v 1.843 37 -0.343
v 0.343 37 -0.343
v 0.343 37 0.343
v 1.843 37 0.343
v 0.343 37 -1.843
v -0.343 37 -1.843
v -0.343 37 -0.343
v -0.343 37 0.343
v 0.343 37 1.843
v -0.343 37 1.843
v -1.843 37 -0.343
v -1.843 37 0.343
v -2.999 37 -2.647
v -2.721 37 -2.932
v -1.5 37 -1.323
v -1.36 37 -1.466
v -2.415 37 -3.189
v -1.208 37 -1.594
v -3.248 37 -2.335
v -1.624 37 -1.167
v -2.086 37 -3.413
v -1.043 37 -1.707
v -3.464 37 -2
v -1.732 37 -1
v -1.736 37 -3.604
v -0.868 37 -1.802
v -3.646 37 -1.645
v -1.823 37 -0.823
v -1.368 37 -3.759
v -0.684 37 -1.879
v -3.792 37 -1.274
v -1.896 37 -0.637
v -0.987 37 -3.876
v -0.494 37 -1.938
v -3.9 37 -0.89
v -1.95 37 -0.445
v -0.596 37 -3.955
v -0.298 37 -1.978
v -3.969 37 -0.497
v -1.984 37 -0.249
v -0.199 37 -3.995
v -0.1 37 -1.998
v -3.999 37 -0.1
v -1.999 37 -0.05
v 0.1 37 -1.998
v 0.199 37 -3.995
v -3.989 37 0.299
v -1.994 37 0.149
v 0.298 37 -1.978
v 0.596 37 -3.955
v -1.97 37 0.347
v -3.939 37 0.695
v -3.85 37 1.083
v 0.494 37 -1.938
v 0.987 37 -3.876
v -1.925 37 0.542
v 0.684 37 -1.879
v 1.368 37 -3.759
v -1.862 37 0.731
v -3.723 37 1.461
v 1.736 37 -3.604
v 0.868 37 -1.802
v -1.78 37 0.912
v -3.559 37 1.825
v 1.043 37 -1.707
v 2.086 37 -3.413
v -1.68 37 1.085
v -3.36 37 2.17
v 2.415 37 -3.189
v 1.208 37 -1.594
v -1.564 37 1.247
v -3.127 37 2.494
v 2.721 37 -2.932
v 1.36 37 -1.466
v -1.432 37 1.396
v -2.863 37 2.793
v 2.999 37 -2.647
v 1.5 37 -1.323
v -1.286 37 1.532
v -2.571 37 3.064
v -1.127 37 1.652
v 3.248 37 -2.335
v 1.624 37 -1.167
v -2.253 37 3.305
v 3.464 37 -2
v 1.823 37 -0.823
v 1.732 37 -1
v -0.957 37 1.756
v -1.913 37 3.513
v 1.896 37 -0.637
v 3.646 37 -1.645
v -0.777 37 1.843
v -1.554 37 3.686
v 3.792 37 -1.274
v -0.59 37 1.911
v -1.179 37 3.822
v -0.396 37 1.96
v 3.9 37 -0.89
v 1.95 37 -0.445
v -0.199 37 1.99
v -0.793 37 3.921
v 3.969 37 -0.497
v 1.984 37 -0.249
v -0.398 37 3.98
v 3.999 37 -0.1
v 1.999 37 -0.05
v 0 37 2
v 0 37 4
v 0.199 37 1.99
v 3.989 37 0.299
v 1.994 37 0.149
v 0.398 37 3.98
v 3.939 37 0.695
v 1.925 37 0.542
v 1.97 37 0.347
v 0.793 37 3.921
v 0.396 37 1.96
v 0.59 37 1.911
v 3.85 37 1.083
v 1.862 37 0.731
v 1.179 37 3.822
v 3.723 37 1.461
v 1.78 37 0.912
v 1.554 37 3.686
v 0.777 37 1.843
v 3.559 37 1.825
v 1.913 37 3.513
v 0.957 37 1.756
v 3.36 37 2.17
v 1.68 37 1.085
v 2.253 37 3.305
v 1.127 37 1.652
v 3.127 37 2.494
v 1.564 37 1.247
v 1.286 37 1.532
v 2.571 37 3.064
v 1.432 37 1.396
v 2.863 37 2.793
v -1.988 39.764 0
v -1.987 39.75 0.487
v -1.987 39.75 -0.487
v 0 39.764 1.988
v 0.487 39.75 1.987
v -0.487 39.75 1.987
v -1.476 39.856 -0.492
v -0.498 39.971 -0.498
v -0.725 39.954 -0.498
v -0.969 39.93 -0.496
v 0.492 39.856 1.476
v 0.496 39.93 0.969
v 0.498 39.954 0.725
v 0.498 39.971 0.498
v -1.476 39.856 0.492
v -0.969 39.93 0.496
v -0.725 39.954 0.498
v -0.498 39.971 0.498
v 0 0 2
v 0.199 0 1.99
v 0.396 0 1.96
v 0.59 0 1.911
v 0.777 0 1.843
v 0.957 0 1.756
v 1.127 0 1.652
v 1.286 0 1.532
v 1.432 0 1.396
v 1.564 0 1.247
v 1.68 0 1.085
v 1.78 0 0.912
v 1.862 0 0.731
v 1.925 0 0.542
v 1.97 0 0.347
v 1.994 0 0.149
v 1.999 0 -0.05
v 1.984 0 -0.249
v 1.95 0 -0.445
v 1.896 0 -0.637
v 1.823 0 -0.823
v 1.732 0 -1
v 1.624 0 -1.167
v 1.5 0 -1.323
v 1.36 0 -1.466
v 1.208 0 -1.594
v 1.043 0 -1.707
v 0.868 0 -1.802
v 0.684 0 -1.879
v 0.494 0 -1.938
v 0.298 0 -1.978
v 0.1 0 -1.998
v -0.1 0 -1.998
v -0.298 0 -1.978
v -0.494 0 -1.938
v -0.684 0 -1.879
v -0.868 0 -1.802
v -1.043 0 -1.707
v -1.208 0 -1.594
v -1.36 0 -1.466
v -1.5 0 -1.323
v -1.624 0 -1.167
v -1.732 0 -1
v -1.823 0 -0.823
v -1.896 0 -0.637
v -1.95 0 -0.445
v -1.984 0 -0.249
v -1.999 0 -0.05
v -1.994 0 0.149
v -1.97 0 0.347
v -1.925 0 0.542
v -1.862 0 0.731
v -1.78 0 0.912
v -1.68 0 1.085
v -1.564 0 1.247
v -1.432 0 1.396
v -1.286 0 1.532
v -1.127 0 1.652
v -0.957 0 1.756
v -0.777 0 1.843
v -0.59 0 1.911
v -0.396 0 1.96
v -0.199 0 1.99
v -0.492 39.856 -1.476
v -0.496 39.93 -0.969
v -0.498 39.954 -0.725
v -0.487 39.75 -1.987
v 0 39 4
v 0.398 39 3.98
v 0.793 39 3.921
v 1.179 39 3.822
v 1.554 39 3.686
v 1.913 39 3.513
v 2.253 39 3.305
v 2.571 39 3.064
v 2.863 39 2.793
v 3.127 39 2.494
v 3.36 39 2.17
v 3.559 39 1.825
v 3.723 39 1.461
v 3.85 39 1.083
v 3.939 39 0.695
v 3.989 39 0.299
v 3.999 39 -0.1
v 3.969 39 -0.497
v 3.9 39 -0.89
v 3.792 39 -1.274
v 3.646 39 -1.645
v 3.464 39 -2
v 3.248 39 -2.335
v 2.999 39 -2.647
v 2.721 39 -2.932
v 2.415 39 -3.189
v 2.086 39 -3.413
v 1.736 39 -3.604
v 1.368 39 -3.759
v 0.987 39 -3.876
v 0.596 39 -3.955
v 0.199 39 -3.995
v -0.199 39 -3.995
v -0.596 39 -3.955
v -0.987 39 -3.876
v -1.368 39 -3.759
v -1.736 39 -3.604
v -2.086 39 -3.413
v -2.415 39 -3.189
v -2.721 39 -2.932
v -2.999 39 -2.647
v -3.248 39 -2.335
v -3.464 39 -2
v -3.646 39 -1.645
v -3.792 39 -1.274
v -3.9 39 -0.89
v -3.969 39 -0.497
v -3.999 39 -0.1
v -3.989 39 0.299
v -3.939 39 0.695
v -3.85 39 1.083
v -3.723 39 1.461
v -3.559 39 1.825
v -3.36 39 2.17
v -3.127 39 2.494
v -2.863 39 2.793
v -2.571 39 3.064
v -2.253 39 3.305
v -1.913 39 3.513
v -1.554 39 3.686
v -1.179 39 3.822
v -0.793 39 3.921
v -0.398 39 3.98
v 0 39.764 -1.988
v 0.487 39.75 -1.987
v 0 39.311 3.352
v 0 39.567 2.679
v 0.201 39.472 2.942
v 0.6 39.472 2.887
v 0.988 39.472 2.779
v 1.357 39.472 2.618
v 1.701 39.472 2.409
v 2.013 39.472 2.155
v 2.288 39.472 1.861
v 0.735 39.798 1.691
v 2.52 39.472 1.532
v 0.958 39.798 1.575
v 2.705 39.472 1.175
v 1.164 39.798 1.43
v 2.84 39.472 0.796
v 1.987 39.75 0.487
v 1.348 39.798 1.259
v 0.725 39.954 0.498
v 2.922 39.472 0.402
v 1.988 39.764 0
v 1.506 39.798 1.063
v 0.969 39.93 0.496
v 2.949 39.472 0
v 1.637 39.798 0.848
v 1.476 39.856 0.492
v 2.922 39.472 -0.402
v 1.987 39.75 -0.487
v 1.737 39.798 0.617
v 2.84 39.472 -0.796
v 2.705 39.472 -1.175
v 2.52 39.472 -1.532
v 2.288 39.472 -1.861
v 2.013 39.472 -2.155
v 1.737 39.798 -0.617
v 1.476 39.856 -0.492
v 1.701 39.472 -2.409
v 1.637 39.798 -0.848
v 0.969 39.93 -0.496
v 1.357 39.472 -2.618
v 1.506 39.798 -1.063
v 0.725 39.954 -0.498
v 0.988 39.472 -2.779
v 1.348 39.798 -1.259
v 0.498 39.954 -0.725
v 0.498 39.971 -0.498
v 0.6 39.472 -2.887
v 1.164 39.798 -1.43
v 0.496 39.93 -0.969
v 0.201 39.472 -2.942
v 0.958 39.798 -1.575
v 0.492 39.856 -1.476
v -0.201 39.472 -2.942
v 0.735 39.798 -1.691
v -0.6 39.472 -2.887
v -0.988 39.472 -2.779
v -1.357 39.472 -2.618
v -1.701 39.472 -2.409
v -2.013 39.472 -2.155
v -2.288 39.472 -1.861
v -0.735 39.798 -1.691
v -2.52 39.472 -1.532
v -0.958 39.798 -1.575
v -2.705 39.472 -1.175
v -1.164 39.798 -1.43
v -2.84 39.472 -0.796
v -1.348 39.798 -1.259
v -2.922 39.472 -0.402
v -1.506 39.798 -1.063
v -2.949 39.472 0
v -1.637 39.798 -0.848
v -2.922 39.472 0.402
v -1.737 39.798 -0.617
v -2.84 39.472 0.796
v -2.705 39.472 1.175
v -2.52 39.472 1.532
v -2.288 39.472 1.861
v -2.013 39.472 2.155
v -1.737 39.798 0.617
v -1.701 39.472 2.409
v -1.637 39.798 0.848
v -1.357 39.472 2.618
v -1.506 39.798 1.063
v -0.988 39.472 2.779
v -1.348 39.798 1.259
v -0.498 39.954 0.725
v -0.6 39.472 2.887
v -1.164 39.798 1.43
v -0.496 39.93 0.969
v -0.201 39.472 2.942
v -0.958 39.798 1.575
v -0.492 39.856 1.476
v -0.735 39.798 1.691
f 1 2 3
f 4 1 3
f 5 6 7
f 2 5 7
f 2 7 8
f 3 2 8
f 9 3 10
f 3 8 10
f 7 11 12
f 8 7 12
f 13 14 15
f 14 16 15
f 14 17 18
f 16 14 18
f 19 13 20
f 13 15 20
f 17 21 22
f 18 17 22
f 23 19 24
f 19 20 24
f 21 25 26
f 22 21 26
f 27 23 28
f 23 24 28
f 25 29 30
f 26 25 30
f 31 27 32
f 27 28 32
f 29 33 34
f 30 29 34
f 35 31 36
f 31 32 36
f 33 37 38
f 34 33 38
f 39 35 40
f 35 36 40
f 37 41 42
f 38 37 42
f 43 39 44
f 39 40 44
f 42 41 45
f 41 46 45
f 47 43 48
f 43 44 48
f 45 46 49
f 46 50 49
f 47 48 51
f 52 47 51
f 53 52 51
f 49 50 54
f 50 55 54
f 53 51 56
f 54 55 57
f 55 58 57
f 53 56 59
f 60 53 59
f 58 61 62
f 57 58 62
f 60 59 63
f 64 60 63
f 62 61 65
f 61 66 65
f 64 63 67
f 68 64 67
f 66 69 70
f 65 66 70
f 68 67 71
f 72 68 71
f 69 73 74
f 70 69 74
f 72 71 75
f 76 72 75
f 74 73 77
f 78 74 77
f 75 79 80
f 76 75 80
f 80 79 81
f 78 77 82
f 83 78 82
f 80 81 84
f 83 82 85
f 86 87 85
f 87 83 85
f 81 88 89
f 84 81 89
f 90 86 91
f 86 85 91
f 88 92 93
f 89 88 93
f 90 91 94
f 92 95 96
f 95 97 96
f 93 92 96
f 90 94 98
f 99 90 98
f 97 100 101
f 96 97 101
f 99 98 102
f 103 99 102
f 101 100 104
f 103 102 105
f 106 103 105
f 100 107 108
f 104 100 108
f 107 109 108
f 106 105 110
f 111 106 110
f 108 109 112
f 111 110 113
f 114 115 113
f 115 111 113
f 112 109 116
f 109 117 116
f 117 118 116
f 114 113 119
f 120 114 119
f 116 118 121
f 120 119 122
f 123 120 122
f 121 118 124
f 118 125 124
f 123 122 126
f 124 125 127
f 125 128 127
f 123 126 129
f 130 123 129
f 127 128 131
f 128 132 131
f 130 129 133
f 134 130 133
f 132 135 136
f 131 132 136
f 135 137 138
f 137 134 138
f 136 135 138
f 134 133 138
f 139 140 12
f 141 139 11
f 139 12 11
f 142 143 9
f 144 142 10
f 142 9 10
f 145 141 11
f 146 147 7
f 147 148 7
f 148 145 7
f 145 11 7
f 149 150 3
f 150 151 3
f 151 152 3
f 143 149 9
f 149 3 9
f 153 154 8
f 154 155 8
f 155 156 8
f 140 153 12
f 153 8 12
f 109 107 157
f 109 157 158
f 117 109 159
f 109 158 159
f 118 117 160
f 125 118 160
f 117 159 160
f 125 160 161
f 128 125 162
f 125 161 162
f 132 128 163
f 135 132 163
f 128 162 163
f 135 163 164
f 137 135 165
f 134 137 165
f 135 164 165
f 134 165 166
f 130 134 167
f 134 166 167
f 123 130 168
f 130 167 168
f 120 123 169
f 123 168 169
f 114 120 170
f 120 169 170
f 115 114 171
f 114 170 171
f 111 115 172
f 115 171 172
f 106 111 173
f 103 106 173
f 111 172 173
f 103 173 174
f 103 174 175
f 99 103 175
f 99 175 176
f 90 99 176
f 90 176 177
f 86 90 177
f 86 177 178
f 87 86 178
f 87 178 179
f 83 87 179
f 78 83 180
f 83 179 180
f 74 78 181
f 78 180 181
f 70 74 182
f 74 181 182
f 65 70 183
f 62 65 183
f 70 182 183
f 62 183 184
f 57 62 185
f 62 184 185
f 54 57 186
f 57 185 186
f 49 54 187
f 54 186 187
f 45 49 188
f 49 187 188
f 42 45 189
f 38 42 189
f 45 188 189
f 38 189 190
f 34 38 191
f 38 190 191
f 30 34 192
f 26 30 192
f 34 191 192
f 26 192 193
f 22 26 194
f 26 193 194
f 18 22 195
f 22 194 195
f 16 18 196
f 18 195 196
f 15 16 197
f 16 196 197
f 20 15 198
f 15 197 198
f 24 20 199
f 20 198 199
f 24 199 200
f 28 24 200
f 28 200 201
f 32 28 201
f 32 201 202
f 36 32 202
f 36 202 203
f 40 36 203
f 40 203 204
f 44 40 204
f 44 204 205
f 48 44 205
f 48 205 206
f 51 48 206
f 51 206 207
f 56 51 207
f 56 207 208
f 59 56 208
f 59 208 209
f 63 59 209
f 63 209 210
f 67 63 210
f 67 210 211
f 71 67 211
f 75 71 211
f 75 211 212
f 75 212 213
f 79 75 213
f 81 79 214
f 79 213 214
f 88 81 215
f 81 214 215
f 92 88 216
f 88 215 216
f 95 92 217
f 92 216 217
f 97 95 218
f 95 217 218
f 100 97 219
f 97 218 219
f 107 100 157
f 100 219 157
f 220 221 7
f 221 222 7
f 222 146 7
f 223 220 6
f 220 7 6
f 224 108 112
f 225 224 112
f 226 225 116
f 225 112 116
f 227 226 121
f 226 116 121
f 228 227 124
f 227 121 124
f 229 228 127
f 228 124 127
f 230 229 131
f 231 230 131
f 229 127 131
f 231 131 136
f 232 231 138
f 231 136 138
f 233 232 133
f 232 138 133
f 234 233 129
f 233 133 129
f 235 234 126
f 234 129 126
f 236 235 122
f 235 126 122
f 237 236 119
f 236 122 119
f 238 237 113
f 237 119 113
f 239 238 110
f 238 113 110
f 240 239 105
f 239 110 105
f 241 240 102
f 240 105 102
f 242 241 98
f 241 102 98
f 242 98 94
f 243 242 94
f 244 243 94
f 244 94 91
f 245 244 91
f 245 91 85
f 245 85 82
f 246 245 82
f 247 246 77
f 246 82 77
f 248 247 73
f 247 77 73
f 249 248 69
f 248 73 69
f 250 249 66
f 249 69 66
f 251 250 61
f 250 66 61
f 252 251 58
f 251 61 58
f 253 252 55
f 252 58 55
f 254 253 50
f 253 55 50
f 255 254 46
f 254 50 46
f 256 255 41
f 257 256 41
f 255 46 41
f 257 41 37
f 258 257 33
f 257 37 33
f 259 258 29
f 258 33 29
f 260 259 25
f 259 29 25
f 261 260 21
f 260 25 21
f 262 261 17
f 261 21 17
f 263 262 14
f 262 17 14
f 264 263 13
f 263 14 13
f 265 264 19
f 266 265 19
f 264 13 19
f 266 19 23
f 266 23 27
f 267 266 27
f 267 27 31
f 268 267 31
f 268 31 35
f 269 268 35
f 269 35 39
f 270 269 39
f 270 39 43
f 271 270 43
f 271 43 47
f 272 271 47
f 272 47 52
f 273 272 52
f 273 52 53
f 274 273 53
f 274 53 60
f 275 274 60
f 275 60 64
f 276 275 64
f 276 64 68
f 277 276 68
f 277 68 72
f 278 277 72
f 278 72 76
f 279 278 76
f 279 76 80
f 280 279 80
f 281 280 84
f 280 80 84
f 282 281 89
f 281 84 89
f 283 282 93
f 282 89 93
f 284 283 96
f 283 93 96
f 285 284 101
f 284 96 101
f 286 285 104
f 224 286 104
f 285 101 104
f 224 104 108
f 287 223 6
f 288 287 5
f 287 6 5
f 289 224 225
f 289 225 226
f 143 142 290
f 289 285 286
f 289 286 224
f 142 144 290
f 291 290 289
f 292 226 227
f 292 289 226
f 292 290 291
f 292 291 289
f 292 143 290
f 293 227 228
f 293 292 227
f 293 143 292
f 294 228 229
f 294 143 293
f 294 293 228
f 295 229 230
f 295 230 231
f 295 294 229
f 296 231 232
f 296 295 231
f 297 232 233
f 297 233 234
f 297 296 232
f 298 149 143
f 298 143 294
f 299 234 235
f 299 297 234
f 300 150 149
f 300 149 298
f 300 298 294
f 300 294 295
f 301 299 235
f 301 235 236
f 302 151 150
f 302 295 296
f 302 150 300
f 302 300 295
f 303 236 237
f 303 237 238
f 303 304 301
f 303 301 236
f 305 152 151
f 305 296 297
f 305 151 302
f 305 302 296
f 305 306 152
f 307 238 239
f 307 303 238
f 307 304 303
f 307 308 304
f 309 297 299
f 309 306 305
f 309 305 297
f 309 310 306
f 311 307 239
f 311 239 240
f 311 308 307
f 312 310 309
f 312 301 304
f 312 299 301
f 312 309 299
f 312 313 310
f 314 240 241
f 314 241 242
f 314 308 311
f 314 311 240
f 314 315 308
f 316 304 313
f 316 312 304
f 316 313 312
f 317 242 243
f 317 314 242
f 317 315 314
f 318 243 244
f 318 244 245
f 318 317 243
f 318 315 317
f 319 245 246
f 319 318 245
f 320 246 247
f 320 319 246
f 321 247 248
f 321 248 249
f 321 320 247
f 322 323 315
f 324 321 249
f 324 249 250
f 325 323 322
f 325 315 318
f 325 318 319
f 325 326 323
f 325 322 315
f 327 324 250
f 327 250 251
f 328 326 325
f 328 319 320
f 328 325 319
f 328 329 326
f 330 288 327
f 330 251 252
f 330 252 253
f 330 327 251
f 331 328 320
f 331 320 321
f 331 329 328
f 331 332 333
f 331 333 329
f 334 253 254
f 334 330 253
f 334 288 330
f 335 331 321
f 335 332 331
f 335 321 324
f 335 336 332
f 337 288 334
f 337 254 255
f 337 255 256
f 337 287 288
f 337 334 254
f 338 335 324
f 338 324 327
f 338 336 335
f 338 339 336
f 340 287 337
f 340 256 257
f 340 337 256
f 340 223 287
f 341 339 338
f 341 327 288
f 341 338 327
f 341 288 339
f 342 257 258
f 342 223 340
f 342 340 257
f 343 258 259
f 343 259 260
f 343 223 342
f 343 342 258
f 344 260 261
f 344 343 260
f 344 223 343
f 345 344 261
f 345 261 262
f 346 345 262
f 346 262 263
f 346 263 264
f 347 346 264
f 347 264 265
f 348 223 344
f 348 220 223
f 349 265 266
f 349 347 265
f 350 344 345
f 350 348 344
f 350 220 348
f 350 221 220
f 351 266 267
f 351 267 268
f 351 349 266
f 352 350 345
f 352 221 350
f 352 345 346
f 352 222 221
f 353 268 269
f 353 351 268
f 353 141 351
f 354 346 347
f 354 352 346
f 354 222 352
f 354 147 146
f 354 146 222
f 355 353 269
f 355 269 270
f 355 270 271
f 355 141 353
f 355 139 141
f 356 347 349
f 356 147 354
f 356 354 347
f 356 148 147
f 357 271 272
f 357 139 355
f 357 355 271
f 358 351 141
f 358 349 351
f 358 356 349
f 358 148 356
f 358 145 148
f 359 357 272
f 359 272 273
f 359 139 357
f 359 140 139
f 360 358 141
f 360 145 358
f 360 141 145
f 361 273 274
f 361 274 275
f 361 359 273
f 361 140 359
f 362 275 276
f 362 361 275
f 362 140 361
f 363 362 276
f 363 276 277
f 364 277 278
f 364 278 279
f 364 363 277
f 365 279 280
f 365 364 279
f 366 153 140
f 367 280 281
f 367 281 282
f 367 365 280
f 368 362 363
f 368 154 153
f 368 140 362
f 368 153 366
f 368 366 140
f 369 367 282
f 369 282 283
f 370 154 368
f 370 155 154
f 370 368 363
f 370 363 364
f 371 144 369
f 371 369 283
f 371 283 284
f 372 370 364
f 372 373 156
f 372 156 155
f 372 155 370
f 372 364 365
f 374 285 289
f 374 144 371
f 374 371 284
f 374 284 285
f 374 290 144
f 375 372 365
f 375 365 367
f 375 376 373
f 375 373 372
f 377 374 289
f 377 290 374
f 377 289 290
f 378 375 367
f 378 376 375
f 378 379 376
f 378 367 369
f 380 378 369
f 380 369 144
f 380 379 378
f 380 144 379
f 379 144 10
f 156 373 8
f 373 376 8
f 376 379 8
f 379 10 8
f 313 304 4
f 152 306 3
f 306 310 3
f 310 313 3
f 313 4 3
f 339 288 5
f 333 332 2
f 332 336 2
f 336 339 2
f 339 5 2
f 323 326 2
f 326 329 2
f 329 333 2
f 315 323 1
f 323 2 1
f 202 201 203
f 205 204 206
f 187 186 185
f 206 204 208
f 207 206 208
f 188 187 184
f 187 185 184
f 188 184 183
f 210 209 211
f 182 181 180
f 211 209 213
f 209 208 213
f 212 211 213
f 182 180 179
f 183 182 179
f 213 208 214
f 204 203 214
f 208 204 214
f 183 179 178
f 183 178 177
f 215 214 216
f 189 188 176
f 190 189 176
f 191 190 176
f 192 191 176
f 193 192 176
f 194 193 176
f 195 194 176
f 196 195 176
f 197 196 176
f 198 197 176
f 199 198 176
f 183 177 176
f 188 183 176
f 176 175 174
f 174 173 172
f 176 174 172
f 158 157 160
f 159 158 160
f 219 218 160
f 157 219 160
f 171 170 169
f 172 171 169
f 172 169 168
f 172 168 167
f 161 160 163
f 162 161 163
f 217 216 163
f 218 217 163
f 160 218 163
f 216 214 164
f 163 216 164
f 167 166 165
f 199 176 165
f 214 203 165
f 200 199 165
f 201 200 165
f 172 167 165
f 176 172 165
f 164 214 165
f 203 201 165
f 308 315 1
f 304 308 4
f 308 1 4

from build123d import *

# Parameters (mm, degrees)
SKETCH1_R           = 2
BOSS_EXTRUDE1_DEPTH = 37
SKETCH2_R           = 4
BOSS_EXTRUDE2_DEPTH = 2
DOME1_FACE_RADIUS   = 4
DOME1_HEIGHT        = 1
CUT_EXTRUDE1_DEPTH  = 3
CUT_EXTRUDE1_TAPER  = 3


with BuildPart() as part:
    # Sketch1 → Boss-Extrude1 (new body)
    with BuildSketch(Plane(origin=(0, 0, 0), x_dir=(1, 0, 0), z_dir=(0, 1, 0))):
        with Locations(Location((0, 0, 0), (0, 0, 270))):
            Circle(SKETCH1_R)
    extrude(amount=BOSS_EXTRUDE1_DEPTH)

    # Sketch2 → Boss-Extrude2 (add)
    with BuildSketch(Plane(origin=(0, 37, 0), x_dir=(1, 0, 0), z_dir=(0, 1, 0))):
        with Locations(Location((0, 0, 0), (0, 0, 270))):
            Circle(SKETCH2_R)
    extrude(amount=BOSS_EXTRUDE2_DEPTH)

    # Dome1: a dome of height H over a round flat face of radius A is a cap of a sphere of radius (A * A + H * H) / (2 * H)
    dome1_r = (DOME1_FACE_RADIUS * DOME1_FACE_RADIUS + DOME1_HEIGHT * DOME1_HEIGHT) / (2 * DOME1_HEIGHT)
    dome1_base = Plane((0, 39, 0), z_dir=(0, 1, 0))
    with Locations(dome1_base.offset(DOME1_HEIGHT - dome1_r)):
        dome1_ball = Sphere(dome1_r, mode=Mode.PRIVATE)
    add(split(dome1_ball, bisect_by=dome1_base, keep=Keep.TOP, mode=Mode.PRIVATE))

    # Sketch4 → Cut-Extrude1 (cut)
    with BuildSketch(Plane(origin=(0, 40, 0), x_dir=(-1, 0, 0), z_dir=(0, -1, 0))):
        Polygon((-0.5, 0.5), (-2, 0.5), (-2, -0.5), (-0.5, -0.5), (-0.5, -2), (0.5, -2), (0.5, -0.5), (2, -0.5), (2, 0.5), (0.5, 0.5), (0.5, 2), (-0.5, 2), align=None)
    extrude(amount=CUT_EXTRUDE1_DEPTH, taper=CUT_EXTRUDE1_TAPER, mode=Mode.SUBTRACT)


solid = part.part
